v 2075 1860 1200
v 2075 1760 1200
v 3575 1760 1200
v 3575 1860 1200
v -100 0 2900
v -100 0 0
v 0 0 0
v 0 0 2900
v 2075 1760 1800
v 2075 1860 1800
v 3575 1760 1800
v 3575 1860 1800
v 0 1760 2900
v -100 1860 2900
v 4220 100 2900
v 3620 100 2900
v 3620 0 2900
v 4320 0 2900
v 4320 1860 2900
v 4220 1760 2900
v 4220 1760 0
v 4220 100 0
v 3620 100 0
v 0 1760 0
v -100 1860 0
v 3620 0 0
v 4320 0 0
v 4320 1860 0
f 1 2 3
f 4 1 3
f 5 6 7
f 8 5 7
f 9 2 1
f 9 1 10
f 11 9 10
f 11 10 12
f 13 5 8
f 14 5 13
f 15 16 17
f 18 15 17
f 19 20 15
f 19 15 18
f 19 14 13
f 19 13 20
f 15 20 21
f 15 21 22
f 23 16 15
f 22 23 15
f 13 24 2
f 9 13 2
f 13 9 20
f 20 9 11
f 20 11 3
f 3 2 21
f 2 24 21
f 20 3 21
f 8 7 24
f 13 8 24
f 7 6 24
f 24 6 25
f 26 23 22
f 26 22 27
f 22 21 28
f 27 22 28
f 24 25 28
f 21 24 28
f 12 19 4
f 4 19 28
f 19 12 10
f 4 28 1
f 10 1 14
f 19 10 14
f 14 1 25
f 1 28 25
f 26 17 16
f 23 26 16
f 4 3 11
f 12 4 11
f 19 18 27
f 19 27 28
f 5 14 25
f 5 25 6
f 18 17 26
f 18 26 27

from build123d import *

# Parameters (mm, degrees)
F1_DEPTH = 2900
F2_W     = 1500
F2_H     = 600
F3_DEPTH = 100
F4_W     = 700
F4_H     = 100
F5_DEPTH = 2900


with BuildPart() as f1:
    # F0 (on Top) → F1 (new body)
    with BuildSketch(Plane.XY):
        Polygon((-100, 0), (0, 0), (0, 1760), (4220, 1760), (4220, 0), (4320, 0), (4320, 1860), (-100, 1860), align=None)
    extrude(amount=F1_DEPTH)

    # F2 (on face) → F3 (cut, through all)
    with BuildSketch(Plane.XZ.offset(-1760)):
        with Locations((2825, 1500)):
            Rectangle(F2_W, F2_H)
    extrude(amount=-F3_DEPTH, mode=Mode.SUBTRACT)

    # F4 (on face) → F5 (join)
    with BuildSketch(Plane.XY.offset(2900)):
        with Locations((3970, 50)):
            Rectangle(F4_W, F4_H)
    extrude(amount=-F5_DEPTH)


solid = f1.part
